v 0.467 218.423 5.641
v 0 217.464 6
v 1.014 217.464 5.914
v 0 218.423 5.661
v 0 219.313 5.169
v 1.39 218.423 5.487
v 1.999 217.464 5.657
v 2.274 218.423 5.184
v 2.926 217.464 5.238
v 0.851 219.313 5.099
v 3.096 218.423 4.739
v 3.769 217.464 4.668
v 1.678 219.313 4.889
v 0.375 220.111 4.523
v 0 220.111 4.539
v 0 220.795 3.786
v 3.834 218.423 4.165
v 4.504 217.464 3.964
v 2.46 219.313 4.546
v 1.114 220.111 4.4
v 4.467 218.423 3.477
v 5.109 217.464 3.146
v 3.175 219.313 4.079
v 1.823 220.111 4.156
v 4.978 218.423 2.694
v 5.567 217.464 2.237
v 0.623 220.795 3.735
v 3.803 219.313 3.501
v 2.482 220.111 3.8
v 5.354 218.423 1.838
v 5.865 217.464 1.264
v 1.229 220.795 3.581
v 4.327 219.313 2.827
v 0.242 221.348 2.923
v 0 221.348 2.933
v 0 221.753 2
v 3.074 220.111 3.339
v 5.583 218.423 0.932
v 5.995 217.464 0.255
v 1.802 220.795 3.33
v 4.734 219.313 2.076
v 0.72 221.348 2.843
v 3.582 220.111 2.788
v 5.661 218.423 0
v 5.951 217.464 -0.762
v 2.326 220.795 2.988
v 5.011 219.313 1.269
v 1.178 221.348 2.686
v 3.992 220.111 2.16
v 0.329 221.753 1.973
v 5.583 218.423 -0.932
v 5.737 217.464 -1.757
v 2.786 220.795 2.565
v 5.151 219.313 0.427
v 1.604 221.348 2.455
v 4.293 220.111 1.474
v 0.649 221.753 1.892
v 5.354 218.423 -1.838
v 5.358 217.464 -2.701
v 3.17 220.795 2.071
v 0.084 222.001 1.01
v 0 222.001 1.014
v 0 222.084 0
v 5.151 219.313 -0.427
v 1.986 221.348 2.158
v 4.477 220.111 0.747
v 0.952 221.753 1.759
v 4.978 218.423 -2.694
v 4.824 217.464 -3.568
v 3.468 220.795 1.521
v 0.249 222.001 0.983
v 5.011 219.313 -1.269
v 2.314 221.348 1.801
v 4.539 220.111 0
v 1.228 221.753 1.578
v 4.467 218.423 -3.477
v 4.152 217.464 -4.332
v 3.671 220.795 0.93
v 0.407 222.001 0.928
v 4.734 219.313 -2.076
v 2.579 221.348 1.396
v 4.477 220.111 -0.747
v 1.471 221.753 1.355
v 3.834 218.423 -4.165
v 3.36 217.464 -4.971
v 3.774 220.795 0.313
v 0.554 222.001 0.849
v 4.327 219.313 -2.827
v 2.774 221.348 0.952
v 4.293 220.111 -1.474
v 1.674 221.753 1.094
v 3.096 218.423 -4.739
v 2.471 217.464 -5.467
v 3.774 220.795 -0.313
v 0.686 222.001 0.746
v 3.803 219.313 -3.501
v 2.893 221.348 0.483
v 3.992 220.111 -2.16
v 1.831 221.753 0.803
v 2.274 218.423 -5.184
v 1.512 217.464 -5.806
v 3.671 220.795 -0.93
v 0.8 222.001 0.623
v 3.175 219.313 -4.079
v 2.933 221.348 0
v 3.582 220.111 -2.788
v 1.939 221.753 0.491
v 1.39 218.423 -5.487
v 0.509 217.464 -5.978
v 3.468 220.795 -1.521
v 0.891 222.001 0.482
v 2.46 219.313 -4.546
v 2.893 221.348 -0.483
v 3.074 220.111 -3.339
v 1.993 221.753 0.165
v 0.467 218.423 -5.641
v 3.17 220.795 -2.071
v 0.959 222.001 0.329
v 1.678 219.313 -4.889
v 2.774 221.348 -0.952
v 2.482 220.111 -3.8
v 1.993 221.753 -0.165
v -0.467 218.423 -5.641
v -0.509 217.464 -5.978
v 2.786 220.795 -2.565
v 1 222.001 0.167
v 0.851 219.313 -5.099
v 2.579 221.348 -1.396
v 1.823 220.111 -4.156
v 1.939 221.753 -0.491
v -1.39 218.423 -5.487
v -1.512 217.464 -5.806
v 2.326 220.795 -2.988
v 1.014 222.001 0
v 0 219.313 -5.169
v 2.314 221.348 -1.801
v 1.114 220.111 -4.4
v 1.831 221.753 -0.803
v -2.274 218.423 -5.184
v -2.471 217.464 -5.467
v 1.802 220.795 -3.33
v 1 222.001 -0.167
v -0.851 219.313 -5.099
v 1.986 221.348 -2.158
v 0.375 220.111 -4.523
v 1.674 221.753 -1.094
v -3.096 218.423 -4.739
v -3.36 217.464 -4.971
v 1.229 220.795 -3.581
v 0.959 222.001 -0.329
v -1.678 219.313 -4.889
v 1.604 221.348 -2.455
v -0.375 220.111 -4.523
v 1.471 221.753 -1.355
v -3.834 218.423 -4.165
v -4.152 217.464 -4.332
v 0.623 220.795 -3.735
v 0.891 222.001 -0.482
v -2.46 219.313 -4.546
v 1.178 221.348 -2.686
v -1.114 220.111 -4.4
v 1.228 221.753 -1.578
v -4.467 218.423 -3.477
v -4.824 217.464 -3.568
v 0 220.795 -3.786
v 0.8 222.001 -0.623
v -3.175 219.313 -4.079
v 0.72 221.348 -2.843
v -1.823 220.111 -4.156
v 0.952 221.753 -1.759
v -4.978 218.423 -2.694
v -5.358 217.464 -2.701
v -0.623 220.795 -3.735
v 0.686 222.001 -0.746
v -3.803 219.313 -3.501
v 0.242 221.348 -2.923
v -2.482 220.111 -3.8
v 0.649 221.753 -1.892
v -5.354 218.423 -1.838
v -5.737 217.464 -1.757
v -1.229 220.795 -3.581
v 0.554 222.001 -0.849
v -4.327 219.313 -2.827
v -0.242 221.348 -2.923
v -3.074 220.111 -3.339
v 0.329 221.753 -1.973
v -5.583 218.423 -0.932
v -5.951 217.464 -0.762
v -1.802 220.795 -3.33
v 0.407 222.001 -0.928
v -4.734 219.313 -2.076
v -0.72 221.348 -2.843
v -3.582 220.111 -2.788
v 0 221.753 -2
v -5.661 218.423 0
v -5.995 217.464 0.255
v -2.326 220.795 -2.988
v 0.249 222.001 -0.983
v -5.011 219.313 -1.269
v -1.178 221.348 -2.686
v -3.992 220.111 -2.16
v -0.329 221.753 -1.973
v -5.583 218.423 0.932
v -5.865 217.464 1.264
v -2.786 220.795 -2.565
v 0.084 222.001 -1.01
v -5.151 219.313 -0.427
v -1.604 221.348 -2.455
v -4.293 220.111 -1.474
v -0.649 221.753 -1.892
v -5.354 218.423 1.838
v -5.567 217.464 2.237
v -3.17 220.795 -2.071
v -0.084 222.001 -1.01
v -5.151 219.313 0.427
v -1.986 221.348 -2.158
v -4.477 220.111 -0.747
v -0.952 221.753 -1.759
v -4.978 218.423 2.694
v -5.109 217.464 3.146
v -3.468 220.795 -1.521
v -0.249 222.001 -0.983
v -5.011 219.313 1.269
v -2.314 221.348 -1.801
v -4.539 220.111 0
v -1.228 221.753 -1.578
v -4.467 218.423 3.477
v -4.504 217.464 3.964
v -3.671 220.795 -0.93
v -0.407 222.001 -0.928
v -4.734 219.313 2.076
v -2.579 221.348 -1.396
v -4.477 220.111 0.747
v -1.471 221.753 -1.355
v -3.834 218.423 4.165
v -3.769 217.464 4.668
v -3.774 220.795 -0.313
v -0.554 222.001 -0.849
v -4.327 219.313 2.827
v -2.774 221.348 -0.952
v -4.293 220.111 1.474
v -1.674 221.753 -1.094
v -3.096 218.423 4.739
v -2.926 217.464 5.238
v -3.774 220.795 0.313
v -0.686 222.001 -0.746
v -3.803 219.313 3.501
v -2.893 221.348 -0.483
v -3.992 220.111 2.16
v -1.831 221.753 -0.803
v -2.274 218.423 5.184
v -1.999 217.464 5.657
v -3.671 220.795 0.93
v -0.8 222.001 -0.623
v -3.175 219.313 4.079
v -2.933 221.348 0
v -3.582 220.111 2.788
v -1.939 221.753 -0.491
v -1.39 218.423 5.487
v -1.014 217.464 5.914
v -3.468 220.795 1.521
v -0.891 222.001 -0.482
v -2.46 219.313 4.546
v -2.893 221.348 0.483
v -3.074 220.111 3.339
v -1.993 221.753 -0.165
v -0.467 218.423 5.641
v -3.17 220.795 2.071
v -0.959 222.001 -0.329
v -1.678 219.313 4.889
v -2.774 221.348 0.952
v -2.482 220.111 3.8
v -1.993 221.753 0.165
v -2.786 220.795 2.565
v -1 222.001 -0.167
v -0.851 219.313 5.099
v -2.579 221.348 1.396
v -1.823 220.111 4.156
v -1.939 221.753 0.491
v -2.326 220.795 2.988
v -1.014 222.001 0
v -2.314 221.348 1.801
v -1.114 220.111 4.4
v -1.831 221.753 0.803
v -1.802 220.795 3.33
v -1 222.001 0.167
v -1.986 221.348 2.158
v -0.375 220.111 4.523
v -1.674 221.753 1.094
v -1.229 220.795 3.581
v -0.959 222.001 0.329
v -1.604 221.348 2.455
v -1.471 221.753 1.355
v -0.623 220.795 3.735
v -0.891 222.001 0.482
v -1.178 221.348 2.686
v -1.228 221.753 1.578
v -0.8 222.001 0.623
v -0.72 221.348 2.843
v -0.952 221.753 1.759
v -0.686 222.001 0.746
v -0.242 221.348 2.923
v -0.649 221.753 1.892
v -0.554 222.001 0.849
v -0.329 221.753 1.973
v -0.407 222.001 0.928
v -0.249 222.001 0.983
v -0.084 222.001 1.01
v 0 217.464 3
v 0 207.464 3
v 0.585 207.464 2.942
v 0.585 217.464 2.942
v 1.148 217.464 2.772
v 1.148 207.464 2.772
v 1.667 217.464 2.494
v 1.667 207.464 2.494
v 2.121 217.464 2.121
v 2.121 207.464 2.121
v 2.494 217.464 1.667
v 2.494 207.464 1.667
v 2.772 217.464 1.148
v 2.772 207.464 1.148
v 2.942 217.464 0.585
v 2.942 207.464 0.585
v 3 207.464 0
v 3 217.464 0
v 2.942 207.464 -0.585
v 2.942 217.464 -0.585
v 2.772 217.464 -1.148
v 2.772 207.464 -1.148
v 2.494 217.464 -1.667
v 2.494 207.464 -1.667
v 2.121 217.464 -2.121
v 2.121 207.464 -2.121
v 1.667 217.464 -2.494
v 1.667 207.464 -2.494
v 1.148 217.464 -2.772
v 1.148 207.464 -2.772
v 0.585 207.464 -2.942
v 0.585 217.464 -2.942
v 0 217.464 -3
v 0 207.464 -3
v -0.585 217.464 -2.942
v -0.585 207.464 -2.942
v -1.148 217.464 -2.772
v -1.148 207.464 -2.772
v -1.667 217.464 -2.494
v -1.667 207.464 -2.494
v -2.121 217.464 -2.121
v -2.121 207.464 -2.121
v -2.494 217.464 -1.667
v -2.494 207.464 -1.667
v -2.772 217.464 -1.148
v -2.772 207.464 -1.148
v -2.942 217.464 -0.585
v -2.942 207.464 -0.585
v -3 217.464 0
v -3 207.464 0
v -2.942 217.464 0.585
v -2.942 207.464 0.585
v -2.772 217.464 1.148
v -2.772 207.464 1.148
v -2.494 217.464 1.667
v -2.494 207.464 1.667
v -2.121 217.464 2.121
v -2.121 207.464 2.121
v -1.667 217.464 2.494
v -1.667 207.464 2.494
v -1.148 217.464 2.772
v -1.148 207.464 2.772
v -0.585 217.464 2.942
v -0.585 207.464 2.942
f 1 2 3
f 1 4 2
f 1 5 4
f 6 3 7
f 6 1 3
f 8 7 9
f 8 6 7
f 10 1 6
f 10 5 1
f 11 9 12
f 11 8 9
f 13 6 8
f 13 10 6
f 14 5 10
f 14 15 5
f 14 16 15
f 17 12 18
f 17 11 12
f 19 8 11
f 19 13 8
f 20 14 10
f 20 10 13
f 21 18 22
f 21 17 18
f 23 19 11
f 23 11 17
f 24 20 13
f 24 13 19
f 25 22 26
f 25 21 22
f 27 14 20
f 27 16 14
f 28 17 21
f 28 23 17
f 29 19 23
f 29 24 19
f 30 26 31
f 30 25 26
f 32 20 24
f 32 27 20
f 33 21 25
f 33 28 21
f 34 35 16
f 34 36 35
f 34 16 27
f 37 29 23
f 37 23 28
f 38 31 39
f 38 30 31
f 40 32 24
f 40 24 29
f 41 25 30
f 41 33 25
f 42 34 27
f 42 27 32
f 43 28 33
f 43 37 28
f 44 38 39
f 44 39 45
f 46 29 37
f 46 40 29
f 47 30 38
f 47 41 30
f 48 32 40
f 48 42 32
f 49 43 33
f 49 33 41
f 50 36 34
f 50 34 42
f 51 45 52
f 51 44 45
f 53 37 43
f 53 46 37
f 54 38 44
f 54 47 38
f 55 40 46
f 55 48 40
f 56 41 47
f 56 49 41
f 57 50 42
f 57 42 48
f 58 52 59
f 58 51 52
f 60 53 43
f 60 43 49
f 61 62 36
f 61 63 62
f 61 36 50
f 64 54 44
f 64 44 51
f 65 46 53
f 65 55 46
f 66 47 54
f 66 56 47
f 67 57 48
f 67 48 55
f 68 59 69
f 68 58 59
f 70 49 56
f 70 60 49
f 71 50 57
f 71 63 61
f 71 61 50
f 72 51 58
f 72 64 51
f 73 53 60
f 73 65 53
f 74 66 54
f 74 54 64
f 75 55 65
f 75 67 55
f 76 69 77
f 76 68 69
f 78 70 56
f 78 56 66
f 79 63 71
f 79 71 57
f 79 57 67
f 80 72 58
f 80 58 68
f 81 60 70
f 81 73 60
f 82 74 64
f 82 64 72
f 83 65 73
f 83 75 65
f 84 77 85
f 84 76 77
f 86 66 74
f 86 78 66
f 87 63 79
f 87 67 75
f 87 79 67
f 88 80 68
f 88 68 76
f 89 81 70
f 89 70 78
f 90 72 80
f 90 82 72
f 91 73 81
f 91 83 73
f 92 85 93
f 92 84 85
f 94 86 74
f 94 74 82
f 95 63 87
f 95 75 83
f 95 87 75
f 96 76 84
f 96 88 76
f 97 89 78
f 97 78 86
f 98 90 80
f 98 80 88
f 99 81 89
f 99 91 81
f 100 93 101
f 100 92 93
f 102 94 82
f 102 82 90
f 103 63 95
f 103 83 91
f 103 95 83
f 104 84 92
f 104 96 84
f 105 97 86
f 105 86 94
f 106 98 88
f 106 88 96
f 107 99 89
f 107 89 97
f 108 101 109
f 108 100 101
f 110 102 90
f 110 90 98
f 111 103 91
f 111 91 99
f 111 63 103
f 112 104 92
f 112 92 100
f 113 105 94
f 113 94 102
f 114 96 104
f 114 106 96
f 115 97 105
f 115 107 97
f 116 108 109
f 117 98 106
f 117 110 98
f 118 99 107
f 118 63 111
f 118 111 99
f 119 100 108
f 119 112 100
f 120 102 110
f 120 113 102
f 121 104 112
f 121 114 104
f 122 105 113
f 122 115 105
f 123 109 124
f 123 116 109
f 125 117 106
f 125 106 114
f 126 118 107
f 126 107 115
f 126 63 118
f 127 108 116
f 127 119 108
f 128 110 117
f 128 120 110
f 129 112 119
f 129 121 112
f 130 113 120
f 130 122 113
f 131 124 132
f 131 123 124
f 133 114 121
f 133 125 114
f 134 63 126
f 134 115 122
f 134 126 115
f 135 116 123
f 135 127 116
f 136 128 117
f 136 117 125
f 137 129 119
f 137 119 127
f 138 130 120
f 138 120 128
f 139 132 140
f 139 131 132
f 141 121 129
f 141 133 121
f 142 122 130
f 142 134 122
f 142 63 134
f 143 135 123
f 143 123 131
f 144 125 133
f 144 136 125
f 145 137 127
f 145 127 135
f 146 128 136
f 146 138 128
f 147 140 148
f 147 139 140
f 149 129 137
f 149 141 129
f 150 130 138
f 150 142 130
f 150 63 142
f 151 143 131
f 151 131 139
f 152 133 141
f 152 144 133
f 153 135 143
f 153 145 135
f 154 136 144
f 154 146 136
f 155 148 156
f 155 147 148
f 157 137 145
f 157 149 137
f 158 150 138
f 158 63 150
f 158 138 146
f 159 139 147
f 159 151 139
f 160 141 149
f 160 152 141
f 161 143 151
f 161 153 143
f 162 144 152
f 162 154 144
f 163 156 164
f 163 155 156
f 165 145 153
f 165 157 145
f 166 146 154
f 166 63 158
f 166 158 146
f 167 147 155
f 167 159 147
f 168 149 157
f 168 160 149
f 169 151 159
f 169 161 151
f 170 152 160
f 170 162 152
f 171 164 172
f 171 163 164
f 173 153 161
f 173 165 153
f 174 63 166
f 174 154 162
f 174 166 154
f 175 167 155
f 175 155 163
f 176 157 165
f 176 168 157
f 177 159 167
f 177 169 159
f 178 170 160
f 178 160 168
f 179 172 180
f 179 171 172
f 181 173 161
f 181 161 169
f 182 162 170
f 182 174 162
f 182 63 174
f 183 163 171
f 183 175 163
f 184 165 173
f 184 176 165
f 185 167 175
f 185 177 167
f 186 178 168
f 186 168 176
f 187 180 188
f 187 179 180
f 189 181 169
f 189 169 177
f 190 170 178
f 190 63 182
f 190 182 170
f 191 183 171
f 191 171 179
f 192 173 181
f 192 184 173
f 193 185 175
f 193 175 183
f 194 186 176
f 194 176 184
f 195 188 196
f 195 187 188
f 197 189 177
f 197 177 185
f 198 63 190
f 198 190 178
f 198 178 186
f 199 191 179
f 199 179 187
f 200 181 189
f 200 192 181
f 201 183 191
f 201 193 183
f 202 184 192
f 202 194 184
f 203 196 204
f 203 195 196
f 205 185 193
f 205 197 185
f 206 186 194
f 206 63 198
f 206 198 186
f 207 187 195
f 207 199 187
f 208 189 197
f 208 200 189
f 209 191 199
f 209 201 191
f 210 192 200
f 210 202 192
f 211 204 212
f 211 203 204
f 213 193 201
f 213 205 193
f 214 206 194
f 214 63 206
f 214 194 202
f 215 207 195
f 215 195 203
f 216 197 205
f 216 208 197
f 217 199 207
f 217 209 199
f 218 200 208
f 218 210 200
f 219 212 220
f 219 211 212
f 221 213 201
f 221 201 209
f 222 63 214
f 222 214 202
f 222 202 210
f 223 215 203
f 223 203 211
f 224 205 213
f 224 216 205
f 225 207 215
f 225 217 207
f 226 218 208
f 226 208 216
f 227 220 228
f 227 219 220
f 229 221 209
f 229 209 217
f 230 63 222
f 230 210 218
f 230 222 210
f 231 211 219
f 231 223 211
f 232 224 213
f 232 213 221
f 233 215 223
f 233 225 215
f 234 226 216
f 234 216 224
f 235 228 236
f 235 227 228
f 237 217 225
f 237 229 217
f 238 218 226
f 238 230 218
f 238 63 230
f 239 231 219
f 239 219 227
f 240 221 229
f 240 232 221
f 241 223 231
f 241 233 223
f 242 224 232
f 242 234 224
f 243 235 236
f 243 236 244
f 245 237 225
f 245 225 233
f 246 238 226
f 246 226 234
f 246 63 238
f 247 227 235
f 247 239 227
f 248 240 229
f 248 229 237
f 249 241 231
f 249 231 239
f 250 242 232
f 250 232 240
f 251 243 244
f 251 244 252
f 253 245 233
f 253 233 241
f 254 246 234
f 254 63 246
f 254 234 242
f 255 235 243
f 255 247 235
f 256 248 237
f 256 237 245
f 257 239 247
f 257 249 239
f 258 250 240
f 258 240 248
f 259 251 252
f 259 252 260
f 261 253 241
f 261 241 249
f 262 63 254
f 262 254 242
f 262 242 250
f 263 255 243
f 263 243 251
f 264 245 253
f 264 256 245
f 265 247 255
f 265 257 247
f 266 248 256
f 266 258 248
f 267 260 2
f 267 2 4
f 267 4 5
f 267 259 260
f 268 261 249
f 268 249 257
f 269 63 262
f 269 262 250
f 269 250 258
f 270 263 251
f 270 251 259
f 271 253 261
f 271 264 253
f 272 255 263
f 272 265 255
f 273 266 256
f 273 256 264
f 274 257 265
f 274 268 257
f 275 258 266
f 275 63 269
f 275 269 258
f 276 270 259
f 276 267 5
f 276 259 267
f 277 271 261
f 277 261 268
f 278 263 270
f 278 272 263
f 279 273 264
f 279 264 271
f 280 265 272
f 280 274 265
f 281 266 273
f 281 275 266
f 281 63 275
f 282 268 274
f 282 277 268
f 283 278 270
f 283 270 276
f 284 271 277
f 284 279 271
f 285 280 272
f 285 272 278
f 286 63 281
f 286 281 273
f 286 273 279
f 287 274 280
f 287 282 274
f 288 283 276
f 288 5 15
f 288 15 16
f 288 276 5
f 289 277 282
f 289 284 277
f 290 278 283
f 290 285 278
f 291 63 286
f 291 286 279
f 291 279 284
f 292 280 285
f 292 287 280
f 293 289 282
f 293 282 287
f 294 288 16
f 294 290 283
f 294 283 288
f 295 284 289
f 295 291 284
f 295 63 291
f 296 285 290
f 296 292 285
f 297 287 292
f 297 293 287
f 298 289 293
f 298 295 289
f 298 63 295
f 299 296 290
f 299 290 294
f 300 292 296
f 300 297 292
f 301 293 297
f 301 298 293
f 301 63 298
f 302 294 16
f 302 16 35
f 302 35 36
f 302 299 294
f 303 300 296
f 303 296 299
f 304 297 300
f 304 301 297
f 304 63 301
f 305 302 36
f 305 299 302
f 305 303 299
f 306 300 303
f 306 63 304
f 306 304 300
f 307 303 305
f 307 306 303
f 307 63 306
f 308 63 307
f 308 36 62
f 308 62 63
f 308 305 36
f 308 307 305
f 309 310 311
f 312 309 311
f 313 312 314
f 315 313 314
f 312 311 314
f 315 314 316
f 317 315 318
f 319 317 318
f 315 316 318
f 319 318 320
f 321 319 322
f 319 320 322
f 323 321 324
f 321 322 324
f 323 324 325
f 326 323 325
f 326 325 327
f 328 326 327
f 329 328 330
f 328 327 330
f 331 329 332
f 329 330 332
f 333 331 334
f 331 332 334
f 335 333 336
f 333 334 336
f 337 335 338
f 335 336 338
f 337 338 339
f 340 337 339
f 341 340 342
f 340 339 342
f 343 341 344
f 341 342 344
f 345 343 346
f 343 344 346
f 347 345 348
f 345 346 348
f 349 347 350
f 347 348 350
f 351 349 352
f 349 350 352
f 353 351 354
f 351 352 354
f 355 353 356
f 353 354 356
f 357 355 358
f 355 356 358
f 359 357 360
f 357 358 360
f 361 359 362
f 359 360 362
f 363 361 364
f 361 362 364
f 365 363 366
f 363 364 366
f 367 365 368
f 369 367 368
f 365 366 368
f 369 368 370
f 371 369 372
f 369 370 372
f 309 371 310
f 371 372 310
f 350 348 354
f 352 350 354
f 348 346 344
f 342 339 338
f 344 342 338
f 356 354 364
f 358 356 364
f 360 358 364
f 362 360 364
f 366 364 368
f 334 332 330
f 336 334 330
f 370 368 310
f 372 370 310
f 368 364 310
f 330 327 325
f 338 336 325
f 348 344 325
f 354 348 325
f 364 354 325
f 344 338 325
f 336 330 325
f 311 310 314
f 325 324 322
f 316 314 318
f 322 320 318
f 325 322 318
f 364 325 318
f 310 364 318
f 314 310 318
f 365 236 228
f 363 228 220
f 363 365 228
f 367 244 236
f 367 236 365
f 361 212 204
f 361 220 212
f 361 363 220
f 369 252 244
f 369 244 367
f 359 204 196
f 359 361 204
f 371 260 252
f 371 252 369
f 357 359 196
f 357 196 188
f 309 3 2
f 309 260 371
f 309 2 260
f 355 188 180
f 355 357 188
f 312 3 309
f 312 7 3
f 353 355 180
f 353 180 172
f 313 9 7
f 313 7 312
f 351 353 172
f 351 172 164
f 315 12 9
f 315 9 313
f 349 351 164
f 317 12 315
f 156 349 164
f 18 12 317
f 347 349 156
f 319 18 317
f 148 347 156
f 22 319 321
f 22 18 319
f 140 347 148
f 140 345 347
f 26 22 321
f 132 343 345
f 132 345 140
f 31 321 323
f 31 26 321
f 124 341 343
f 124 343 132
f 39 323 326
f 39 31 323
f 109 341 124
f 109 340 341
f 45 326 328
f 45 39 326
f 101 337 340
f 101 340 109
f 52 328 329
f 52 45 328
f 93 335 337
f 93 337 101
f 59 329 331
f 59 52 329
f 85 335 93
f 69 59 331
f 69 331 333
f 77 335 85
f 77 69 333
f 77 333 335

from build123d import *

# Parameters (mm, degrees)
SKETCH1_R           = 76.2
BOSS_EXTRUDE1_DEPTH = 254
SCALE1_SCALE        = 0.0393701


with BuildPart() as part:
    # Sketch1 → Boss-Extrude1 (new body)
    with BuildSketch(Plane(origin=(0, 0, 0), x_dir=(1, 0, 0), z_dir=(0, 1, 0))):
        with Locations(Location((0, 0, 0), (0, 0, 270))):
            Circle(SKETCH1_R)
    extrude(amount=BOSS_EXTRUDE1_DEPTH)

    # Sketch2 → Revolve3 (revolve)
    with BuildSketch(Plane(origin=(0, 0, 0), x_dir=(0, 0, -1), z_dir=(1, 0, 0)), mode=Mode.PRIVATE) as revolve3_sk:
        with BuildLine():
            Line((0, 371.361992924), (0, 254))
            Line((0, 254), (76.2, 254))
            Line((76.2, 254), (152.4, 254))
            ThreePointArc((152.4, 254), (96.176397031, 338.621276033), (0, 371.361992924))
        make_face()
    revolve(revolve3_sk.sketch.rotate(Axis((0, 254, 0), (0, 1, 0)), 180), axis=Axis((0, 254, 0), (0, 1, 0)))


with BuildPart() as part_1:
    # Scale1: scaled about (0, 215.966552743, 0)
    add(part.part.scale(SCALE1_SCALE).moved(Location((0, 207.463927965, 0))))


solid = part_1.part
